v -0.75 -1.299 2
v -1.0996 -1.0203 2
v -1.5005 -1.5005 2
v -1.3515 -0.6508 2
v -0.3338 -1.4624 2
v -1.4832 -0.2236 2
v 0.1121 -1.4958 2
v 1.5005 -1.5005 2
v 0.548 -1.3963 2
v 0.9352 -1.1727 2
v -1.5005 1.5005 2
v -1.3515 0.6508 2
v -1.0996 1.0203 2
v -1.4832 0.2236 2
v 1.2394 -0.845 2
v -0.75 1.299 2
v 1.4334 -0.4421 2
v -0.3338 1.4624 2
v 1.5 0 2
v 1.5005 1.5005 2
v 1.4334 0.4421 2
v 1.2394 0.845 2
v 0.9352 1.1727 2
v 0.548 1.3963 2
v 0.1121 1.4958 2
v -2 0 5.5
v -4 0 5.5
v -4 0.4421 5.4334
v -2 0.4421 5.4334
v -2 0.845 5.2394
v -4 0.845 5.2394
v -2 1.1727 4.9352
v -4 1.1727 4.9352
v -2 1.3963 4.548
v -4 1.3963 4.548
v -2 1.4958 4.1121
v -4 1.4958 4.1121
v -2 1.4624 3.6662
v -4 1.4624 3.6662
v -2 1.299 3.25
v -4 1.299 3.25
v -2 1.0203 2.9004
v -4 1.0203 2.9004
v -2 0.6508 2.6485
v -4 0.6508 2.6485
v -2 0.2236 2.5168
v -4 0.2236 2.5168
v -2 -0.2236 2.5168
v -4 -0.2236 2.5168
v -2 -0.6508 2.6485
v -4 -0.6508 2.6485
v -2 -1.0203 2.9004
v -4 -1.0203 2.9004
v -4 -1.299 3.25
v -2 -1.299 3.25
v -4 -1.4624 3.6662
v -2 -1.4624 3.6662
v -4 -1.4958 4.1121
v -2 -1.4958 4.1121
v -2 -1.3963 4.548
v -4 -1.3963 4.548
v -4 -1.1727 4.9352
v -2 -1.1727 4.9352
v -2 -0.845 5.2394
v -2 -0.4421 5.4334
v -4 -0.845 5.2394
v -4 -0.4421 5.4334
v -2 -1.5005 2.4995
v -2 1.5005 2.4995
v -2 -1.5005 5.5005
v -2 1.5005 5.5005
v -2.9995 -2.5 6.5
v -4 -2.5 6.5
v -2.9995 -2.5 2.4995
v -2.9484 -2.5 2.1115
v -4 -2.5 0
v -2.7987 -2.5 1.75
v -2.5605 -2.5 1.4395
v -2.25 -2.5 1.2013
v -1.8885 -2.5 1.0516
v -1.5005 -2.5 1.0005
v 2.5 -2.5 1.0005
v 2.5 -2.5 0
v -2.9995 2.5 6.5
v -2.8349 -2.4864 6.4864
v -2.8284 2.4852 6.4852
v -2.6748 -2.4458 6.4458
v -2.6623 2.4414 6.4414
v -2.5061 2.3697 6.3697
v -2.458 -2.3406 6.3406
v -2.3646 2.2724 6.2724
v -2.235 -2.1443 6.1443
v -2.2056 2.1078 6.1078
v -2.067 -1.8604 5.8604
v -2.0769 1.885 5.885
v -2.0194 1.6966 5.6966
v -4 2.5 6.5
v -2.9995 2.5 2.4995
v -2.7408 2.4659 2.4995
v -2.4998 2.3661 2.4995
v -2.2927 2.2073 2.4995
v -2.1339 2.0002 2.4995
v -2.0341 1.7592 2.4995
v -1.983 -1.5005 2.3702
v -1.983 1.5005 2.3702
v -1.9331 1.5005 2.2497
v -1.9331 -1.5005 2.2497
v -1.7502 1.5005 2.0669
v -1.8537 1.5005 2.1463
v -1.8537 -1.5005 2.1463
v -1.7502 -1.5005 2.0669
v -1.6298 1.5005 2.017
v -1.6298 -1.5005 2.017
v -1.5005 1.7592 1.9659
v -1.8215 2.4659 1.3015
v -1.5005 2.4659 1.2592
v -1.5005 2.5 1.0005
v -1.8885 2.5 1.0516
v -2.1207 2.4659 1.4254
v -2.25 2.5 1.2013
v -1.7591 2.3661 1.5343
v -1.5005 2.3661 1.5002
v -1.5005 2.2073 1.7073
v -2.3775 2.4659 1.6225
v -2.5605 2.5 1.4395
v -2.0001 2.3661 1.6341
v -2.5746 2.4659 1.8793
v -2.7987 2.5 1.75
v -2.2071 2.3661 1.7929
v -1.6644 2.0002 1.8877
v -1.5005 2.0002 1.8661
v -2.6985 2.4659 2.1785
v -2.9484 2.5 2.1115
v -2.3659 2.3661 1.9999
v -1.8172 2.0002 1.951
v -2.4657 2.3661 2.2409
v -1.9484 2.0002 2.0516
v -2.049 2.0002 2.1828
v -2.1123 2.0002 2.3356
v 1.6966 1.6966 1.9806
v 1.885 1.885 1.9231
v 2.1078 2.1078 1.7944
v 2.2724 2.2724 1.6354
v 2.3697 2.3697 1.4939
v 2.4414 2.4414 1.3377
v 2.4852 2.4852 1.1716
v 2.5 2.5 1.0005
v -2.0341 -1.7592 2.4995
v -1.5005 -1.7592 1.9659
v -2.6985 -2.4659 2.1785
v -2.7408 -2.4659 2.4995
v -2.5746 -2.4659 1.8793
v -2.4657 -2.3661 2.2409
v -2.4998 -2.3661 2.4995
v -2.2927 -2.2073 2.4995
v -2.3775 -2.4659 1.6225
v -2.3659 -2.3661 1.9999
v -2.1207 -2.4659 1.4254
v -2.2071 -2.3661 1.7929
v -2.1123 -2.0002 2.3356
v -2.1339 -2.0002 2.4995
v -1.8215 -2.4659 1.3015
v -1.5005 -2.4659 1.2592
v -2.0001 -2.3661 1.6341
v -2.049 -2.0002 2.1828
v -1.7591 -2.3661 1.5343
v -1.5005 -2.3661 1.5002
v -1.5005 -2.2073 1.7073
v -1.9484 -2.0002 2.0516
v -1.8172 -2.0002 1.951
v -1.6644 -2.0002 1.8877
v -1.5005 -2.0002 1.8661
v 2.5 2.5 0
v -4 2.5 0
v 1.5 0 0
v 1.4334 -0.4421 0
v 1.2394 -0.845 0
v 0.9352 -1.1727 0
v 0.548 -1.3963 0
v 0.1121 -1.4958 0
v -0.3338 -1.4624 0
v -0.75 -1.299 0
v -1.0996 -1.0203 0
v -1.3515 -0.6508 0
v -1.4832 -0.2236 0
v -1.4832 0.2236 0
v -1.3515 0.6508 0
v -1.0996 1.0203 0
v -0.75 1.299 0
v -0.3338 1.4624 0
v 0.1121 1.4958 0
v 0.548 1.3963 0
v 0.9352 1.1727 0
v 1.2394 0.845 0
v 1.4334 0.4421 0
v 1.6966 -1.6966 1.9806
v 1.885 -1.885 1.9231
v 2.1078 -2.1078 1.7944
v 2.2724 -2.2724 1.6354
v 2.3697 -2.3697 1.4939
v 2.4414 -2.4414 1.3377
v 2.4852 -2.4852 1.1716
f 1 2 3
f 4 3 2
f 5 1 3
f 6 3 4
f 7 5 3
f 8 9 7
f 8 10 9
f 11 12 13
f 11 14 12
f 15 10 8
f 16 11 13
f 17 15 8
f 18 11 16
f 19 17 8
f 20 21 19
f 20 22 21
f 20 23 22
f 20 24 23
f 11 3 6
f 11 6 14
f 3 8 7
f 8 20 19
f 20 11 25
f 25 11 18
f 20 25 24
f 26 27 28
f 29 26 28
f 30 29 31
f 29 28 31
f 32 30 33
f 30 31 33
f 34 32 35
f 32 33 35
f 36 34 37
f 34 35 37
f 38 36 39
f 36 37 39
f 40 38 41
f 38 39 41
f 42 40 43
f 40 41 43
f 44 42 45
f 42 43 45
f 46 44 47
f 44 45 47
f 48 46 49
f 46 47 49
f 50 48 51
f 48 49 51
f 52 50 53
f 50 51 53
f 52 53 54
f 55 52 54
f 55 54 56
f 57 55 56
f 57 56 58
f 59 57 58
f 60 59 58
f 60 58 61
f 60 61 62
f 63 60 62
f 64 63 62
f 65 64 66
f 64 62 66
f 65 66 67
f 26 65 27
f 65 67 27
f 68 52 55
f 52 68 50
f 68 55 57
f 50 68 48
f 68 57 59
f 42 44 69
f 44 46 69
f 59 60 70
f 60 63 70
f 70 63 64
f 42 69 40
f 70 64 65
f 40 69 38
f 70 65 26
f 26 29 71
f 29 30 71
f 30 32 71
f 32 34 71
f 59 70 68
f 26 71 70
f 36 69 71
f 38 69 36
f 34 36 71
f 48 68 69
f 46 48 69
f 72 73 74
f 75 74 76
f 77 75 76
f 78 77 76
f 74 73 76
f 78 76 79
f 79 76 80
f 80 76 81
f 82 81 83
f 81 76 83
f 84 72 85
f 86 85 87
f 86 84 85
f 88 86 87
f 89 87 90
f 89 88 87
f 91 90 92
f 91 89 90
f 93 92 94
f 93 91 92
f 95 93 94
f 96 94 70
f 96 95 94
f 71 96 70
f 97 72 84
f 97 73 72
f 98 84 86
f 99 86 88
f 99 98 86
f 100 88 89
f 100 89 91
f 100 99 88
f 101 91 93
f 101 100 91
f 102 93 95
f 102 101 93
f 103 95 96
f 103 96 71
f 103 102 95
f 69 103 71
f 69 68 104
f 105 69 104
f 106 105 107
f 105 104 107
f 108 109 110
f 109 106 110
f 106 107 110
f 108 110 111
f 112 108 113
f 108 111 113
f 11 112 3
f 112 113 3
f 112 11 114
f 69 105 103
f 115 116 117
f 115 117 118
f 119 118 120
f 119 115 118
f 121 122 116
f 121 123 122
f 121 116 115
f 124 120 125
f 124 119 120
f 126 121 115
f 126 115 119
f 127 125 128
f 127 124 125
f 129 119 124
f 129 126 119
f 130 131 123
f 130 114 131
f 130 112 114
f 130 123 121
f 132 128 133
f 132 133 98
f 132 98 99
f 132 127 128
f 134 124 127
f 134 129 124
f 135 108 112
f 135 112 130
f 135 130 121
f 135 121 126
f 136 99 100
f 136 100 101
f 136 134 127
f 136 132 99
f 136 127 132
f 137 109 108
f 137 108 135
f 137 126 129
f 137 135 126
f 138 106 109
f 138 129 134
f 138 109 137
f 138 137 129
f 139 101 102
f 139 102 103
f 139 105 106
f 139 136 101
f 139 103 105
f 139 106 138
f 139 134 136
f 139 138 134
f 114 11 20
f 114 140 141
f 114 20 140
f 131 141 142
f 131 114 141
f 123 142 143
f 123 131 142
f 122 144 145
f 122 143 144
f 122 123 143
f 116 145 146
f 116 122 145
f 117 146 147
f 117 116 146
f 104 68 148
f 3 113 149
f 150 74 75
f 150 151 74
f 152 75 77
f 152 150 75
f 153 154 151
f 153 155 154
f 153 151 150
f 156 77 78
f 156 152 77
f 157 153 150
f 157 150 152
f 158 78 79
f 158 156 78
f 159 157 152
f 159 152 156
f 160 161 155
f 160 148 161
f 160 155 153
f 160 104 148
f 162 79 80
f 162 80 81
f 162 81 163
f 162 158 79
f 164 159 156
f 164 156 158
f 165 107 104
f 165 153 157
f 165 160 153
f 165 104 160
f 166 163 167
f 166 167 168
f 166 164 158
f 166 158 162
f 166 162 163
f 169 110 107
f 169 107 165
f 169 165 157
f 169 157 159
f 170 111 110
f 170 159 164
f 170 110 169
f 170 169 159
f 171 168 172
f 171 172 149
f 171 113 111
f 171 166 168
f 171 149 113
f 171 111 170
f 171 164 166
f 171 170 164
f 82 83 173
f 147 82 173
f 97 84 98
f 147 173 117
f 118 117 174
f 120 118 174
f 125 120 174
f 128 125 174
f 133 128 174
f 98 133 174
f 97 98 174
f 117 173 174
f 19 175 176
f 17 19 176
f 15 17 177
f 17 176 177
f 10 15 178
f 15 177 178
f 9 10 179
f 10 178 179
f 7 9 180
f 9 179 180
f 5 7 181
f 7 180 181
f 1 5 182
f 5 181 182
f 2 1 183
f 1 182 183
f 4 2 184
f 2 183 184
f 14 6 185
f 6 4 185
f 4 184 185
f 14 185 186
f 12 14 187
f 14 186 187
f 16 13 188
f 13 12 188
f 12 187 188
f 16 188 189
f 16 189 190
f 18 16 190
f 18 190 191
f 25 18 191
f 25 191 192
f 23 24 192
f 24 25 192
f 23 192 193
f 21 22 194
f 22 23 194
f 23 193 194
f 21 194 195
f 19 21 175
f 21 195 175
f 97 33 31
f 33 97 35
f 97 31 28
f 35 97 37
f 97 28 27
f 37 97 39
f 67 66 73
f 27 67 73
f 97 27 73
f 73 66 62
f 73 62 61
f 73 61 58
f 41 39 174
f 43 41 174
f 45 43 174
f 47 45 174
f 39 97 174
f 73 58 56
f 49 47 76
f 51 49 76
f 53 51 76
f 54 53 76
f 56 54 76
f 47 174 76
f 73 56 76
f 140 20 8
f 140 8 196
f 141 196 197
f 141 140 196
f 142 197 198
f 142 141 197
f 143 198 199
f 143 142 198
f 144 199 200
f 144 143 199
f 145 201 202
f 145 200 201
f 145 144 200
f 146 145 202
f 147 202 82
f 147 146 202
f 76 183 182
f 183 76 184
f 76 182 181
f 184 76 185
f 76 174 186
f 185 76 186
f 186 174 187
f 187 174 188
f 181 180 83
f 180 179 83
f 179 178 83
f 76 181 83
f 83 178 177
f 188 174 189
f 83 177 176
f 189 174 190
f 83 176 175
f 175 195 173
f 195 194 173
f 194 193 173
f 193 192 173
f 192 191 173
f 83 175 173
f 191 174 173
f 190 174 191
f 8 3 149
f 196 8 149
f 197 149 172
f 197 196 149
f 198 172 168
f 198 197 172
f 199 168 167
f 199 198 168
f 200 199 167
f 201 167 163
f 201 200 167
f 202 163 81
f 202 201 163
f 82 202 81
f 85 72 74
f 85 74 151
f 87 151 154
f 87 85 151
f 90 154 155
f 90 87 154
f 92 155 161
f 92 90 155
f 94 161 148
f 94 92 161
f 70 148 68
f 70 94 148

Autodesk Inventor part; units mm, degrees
ref_plane "YZ Plane" through (0, 0, 0) normal (1, 0, 0) x (0, 1, 0)
ref_plane "XZ Plane" through (0, 0, 0) normal (0, 1, 0) x (-1, 0, 0)
ref_plane "XY Plane" through (0, 0, 0) normal (0, 0, 1) x (1, 0, 0)
sketch "Sketch1" plane through (0, 0, 0) normal (0, 0, 1) x (1, 0, 0)
  circle A0 centre (0, 0) radius 1.5
  line L0 (2.5, 2.5) -> (-4, 2.5)
  line L1 (-4, 2.5) -> (-4, -2.5)
  line L2 (-4, -2.5) -> (2.5, -2.5)
  line L3 (2.5, -2.5) -> (2.5, 2.5)
  dimension "d0" = 3
  dimension "d1" = 1
  dimension "d2" = 1
  dimension "d3" = 1
  dimension "d4" = 2.5
extrude "Extrusion1" add sketch "Sketch1" along normal blind 2
sketch "Sketch2" plane through (-4, -2.5, 0) normal (-1, 0, 0) x (0, 0, 1)
  line L0 (0, 0) -> (2, 0) projected
  line L1 (0, 0) -> (6.5, 0)
  line L2 (6.5, 0) -> (6.5, 5)
  line L3 (6.5, 5) -> (0, 5)
  line L4 (0, 5) -> (0, 0)
  circle A0 centre (4, 2.5) radius 1.5
  point P0 (0, 2.5)
  dimension "d7" = 3
  dimension "d8" = 2.5
  dimension "d9" = 1
  dimension "d10" = 1
  dimension "d11" = 1
extrude "Extrusion2" add sketch "Sketch2" against normal blind 2
fillet "Fillet2" radius 0.5 1 edges at (-2, 0, 2)
fillet "Fillet2" radius 1 6 edges at (0.25, 2.5, 2) (-2, 2.5, 4.25) (-2, 0, 6.5) (-2, -2.5, 4.25) (0.25, -2.5, 2) (2.5, 0, 2)
properties part number "draat tap stukje 1"
